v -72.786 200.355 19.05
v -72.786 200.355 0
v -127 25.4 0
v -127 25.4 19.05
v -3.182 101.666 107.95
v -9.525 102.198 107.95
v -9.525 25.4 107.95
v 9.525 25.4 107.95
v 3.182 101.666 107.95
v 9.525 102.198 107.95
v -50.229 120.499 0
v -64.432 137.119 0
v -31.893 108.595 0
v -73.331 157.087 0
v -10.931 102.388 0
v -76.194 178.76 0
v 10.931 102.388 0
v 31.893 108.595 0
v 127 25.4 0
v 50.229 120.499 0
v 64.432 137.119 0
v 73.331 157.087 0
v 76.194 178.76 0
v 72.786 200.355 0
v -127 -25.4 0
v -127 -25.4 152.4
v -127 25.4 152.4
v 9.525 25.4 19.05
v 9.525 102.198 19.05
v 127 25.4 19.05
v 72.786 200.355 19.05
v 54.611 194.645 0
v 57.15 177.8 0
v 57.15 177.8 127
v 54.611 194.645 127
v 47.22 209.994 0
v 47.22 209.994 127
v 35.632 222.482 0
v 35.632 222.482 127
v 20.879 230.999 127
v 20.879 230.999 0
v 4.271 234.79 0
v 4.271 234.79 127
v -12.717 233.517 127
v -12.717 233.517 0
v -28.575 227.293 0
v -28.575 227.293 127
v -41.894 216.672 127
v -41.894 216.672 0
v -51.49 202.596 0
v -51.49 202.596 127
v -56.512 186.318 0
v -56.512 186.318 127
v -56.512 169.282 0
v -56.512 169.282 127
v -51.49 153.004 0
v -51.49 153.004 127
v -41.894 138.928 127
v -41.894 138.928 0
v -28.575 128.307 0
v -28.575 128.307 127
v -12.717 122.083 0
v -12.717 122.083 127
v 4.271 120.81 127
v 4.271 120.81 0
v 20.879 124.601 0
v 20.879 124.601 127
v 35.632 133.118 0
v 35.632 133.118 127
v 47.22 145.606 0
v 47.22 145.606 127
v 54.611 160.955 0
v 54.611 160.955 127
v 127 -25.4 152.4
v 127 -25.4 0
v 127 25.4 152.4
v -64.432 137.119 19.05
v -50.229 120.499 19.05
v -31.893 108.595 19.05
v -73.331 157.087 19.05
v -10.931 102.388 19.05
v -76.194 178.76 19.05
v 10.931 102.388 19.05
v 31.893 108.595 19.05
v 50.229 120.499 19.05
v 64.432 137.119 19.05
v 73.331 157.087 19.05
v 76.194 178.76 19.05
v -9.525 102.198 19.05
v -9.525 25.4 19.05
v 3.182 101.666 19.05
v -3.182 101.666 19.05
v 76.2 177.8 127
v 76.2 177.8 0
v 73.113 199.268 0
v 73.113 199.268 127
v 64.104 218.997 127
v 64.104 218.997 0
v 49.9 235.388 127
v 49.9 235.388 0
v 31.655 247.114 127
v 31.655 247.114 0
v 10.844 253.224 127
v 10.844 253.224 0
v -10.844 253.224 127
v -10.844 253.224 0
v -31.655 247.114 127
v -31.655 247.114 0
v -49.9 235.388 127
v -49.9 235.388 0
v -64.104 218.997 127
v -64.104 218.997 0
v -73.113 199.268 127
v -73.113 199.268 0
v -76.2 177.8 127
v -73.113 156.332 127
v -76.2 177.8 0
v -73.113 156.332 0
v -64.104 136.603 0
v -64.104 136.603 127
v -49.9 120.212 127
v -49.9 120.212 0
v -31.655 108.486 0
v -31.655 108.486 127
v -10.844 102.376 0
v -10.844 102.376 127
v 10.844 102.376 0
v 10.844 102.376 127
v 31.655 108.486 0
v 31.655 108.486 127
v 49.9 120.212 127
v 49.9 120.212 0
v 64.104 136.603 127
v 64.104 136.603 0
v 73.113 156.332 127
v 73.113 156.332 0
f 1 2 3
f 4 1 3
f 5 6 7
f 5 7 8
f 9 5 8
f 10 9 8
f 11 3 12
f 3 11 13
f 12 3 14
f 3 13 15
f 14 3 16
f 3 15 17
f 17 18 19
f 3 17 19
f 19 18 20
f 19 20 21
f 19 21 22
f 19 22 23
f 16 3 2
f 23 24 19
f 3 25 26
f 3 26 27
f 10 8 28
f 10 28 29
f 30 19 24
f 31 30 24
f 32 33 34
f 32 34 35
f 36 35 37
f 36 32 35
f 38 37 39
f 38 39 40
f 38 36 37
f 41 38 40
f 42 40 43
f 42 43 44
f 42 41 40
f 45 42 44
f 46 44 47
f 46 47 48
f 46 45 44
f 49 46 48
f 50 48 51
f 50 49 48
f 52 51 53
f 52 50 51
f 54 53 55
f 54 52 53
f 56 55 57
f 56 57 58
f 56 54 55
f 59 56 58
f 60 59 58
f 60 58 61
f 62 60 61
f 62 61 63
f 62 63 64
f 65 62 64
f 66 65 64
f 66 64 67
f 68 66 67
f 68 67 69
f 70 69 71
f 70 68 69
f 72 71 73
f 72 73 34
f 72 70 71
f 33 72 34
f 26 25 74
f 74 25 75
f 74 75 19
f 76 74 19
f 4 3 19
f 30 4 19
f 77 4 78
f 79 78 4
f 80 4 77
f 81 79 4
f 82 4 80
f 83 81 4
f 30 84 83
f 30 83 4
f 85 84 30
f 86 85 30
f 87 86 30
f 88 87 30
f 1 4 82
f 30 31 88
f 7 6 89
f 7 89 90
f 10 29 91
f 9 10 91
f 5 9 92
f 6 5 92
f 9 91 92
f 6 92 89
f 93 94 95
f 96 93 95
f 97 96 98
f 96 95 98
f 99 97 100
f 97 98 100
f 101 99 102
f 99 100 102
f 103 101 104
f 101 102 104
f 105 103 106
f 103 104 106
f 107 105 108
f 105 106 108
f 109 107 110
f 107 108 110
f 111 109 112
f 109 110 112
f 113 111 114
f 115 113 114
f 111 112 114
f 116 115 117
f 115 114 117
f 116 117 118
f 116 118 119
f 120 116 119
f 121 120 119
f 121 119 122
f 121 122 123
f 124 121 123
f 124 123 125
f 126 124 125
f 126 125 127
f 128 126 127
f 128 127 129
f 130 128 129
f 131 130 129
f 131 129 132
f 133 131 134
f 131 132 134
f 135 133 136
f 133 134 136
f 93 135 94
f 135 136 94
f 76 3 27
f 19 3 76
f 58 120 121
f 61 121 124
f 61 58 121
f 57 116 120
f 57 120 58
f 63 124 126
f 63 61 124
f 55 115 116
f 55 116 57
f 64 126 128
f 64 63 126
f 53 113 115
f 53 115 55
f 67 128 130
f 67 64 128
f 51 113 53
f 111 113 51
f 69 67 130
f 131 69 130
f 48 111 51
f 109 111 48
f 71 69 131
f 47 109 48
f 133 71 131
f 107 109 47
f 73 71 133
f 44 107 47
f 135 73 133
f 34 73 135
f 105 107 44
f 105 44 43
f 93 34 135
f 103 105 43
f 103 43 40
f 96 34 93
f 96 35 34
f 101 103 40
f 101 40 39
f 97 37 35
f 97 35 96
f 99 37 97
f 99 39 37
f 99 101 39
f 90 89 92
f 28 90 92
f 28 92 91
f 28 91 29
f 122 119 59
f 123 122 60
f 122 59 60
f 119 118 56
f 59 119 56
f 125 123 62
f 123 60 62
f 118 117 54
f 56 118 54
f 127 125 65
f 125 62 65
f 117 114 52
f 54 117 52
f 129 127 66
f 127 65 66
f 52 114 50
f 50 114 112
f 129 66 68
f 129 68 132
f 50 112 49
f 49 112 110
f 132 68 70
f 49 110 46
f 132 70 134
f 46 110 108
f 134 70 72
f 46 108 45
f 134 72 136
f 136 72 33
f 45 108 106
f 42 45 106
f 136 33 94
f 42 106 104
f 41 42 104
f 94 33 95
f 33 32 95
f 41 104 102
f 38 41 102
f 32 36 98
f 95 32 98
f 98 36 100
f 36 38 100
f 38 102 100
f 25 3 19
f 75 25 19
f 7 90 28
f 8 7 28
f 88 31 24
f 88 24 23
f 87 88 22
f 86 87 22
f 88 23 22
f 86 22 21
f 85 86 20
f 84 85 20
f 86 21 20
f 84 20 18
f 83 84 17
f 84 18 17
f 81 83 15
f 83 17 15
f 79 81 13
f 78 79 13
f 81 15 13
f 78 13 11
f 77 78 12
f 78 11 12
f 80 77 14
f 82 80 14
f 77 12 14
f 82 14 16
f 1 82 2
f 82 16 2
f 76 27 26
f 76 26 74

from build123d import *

# Parameters (mm, degrees)
F0_W     = 254
F0_H     = 50.8
F1_DEPTH = 152.4
F2_R     = 76.2
F2_R_2   = 57.15
F3_DEPTH = 127
F5_DEPTH = 19.05
F7_DEPTH = 88.9


with BuildPart() as f1:
    # F0 (on Top) → F1 (new body)
    with BuildSketch(Plane.XY):
        Rectangle(F0_W, F0_H)
    extrude(amount=F1_DEPTH)


with BuildPart() as f3:
    # F2 (on Top) → F3 (new body)
    with BuildSketch(Plane.XY):
        with Locations((0, 177.8)):
            Circle(F2_R)
        with Locations((0, 177.8)):
            Circle(F2_R_2, mode=Mode.SUBTRACT)
    extrude(amount=F3_DEPTH)


with BuildPart() as f5:
    # F4 (on Top) → F5 (new body)
    with BuildSketch(Plane.XY):
        with BuildLine():
            Line((-72.78551, 200.354591), (-127, 25.4))
            Line((-127, 25.4), (127, 25.4))
            Line((127, 25.4), (72.78551, 200.354591))
            ThreePointArc((72.78551, 200.354591), (0, 101.6), (-72.78551, 200.354591))
        make_face()
    extrude(amount=F5_DEPTH)


with BuildPart() as f7:
    # F6 (on face) → F7 (new body)
    with BuildSketch(Plane.XY.offset(19.05)):
        with BuildLine():
            Line((9.525, 25.4), (9.525, 102.197656))
            ThreePointArc((9.525, 102.197656), (0, 101.6), (-9.525, 102.197656))
            Line((-9.525, 102.197656), (-9.525, 25.4))
            Line((-9.525, 25.4), (9.525, 25.4))
        make_face()
    extrude(amount=F7_DEPTH)


solid = Compound([f1.part, f3.part, f5.part, f7.part])
